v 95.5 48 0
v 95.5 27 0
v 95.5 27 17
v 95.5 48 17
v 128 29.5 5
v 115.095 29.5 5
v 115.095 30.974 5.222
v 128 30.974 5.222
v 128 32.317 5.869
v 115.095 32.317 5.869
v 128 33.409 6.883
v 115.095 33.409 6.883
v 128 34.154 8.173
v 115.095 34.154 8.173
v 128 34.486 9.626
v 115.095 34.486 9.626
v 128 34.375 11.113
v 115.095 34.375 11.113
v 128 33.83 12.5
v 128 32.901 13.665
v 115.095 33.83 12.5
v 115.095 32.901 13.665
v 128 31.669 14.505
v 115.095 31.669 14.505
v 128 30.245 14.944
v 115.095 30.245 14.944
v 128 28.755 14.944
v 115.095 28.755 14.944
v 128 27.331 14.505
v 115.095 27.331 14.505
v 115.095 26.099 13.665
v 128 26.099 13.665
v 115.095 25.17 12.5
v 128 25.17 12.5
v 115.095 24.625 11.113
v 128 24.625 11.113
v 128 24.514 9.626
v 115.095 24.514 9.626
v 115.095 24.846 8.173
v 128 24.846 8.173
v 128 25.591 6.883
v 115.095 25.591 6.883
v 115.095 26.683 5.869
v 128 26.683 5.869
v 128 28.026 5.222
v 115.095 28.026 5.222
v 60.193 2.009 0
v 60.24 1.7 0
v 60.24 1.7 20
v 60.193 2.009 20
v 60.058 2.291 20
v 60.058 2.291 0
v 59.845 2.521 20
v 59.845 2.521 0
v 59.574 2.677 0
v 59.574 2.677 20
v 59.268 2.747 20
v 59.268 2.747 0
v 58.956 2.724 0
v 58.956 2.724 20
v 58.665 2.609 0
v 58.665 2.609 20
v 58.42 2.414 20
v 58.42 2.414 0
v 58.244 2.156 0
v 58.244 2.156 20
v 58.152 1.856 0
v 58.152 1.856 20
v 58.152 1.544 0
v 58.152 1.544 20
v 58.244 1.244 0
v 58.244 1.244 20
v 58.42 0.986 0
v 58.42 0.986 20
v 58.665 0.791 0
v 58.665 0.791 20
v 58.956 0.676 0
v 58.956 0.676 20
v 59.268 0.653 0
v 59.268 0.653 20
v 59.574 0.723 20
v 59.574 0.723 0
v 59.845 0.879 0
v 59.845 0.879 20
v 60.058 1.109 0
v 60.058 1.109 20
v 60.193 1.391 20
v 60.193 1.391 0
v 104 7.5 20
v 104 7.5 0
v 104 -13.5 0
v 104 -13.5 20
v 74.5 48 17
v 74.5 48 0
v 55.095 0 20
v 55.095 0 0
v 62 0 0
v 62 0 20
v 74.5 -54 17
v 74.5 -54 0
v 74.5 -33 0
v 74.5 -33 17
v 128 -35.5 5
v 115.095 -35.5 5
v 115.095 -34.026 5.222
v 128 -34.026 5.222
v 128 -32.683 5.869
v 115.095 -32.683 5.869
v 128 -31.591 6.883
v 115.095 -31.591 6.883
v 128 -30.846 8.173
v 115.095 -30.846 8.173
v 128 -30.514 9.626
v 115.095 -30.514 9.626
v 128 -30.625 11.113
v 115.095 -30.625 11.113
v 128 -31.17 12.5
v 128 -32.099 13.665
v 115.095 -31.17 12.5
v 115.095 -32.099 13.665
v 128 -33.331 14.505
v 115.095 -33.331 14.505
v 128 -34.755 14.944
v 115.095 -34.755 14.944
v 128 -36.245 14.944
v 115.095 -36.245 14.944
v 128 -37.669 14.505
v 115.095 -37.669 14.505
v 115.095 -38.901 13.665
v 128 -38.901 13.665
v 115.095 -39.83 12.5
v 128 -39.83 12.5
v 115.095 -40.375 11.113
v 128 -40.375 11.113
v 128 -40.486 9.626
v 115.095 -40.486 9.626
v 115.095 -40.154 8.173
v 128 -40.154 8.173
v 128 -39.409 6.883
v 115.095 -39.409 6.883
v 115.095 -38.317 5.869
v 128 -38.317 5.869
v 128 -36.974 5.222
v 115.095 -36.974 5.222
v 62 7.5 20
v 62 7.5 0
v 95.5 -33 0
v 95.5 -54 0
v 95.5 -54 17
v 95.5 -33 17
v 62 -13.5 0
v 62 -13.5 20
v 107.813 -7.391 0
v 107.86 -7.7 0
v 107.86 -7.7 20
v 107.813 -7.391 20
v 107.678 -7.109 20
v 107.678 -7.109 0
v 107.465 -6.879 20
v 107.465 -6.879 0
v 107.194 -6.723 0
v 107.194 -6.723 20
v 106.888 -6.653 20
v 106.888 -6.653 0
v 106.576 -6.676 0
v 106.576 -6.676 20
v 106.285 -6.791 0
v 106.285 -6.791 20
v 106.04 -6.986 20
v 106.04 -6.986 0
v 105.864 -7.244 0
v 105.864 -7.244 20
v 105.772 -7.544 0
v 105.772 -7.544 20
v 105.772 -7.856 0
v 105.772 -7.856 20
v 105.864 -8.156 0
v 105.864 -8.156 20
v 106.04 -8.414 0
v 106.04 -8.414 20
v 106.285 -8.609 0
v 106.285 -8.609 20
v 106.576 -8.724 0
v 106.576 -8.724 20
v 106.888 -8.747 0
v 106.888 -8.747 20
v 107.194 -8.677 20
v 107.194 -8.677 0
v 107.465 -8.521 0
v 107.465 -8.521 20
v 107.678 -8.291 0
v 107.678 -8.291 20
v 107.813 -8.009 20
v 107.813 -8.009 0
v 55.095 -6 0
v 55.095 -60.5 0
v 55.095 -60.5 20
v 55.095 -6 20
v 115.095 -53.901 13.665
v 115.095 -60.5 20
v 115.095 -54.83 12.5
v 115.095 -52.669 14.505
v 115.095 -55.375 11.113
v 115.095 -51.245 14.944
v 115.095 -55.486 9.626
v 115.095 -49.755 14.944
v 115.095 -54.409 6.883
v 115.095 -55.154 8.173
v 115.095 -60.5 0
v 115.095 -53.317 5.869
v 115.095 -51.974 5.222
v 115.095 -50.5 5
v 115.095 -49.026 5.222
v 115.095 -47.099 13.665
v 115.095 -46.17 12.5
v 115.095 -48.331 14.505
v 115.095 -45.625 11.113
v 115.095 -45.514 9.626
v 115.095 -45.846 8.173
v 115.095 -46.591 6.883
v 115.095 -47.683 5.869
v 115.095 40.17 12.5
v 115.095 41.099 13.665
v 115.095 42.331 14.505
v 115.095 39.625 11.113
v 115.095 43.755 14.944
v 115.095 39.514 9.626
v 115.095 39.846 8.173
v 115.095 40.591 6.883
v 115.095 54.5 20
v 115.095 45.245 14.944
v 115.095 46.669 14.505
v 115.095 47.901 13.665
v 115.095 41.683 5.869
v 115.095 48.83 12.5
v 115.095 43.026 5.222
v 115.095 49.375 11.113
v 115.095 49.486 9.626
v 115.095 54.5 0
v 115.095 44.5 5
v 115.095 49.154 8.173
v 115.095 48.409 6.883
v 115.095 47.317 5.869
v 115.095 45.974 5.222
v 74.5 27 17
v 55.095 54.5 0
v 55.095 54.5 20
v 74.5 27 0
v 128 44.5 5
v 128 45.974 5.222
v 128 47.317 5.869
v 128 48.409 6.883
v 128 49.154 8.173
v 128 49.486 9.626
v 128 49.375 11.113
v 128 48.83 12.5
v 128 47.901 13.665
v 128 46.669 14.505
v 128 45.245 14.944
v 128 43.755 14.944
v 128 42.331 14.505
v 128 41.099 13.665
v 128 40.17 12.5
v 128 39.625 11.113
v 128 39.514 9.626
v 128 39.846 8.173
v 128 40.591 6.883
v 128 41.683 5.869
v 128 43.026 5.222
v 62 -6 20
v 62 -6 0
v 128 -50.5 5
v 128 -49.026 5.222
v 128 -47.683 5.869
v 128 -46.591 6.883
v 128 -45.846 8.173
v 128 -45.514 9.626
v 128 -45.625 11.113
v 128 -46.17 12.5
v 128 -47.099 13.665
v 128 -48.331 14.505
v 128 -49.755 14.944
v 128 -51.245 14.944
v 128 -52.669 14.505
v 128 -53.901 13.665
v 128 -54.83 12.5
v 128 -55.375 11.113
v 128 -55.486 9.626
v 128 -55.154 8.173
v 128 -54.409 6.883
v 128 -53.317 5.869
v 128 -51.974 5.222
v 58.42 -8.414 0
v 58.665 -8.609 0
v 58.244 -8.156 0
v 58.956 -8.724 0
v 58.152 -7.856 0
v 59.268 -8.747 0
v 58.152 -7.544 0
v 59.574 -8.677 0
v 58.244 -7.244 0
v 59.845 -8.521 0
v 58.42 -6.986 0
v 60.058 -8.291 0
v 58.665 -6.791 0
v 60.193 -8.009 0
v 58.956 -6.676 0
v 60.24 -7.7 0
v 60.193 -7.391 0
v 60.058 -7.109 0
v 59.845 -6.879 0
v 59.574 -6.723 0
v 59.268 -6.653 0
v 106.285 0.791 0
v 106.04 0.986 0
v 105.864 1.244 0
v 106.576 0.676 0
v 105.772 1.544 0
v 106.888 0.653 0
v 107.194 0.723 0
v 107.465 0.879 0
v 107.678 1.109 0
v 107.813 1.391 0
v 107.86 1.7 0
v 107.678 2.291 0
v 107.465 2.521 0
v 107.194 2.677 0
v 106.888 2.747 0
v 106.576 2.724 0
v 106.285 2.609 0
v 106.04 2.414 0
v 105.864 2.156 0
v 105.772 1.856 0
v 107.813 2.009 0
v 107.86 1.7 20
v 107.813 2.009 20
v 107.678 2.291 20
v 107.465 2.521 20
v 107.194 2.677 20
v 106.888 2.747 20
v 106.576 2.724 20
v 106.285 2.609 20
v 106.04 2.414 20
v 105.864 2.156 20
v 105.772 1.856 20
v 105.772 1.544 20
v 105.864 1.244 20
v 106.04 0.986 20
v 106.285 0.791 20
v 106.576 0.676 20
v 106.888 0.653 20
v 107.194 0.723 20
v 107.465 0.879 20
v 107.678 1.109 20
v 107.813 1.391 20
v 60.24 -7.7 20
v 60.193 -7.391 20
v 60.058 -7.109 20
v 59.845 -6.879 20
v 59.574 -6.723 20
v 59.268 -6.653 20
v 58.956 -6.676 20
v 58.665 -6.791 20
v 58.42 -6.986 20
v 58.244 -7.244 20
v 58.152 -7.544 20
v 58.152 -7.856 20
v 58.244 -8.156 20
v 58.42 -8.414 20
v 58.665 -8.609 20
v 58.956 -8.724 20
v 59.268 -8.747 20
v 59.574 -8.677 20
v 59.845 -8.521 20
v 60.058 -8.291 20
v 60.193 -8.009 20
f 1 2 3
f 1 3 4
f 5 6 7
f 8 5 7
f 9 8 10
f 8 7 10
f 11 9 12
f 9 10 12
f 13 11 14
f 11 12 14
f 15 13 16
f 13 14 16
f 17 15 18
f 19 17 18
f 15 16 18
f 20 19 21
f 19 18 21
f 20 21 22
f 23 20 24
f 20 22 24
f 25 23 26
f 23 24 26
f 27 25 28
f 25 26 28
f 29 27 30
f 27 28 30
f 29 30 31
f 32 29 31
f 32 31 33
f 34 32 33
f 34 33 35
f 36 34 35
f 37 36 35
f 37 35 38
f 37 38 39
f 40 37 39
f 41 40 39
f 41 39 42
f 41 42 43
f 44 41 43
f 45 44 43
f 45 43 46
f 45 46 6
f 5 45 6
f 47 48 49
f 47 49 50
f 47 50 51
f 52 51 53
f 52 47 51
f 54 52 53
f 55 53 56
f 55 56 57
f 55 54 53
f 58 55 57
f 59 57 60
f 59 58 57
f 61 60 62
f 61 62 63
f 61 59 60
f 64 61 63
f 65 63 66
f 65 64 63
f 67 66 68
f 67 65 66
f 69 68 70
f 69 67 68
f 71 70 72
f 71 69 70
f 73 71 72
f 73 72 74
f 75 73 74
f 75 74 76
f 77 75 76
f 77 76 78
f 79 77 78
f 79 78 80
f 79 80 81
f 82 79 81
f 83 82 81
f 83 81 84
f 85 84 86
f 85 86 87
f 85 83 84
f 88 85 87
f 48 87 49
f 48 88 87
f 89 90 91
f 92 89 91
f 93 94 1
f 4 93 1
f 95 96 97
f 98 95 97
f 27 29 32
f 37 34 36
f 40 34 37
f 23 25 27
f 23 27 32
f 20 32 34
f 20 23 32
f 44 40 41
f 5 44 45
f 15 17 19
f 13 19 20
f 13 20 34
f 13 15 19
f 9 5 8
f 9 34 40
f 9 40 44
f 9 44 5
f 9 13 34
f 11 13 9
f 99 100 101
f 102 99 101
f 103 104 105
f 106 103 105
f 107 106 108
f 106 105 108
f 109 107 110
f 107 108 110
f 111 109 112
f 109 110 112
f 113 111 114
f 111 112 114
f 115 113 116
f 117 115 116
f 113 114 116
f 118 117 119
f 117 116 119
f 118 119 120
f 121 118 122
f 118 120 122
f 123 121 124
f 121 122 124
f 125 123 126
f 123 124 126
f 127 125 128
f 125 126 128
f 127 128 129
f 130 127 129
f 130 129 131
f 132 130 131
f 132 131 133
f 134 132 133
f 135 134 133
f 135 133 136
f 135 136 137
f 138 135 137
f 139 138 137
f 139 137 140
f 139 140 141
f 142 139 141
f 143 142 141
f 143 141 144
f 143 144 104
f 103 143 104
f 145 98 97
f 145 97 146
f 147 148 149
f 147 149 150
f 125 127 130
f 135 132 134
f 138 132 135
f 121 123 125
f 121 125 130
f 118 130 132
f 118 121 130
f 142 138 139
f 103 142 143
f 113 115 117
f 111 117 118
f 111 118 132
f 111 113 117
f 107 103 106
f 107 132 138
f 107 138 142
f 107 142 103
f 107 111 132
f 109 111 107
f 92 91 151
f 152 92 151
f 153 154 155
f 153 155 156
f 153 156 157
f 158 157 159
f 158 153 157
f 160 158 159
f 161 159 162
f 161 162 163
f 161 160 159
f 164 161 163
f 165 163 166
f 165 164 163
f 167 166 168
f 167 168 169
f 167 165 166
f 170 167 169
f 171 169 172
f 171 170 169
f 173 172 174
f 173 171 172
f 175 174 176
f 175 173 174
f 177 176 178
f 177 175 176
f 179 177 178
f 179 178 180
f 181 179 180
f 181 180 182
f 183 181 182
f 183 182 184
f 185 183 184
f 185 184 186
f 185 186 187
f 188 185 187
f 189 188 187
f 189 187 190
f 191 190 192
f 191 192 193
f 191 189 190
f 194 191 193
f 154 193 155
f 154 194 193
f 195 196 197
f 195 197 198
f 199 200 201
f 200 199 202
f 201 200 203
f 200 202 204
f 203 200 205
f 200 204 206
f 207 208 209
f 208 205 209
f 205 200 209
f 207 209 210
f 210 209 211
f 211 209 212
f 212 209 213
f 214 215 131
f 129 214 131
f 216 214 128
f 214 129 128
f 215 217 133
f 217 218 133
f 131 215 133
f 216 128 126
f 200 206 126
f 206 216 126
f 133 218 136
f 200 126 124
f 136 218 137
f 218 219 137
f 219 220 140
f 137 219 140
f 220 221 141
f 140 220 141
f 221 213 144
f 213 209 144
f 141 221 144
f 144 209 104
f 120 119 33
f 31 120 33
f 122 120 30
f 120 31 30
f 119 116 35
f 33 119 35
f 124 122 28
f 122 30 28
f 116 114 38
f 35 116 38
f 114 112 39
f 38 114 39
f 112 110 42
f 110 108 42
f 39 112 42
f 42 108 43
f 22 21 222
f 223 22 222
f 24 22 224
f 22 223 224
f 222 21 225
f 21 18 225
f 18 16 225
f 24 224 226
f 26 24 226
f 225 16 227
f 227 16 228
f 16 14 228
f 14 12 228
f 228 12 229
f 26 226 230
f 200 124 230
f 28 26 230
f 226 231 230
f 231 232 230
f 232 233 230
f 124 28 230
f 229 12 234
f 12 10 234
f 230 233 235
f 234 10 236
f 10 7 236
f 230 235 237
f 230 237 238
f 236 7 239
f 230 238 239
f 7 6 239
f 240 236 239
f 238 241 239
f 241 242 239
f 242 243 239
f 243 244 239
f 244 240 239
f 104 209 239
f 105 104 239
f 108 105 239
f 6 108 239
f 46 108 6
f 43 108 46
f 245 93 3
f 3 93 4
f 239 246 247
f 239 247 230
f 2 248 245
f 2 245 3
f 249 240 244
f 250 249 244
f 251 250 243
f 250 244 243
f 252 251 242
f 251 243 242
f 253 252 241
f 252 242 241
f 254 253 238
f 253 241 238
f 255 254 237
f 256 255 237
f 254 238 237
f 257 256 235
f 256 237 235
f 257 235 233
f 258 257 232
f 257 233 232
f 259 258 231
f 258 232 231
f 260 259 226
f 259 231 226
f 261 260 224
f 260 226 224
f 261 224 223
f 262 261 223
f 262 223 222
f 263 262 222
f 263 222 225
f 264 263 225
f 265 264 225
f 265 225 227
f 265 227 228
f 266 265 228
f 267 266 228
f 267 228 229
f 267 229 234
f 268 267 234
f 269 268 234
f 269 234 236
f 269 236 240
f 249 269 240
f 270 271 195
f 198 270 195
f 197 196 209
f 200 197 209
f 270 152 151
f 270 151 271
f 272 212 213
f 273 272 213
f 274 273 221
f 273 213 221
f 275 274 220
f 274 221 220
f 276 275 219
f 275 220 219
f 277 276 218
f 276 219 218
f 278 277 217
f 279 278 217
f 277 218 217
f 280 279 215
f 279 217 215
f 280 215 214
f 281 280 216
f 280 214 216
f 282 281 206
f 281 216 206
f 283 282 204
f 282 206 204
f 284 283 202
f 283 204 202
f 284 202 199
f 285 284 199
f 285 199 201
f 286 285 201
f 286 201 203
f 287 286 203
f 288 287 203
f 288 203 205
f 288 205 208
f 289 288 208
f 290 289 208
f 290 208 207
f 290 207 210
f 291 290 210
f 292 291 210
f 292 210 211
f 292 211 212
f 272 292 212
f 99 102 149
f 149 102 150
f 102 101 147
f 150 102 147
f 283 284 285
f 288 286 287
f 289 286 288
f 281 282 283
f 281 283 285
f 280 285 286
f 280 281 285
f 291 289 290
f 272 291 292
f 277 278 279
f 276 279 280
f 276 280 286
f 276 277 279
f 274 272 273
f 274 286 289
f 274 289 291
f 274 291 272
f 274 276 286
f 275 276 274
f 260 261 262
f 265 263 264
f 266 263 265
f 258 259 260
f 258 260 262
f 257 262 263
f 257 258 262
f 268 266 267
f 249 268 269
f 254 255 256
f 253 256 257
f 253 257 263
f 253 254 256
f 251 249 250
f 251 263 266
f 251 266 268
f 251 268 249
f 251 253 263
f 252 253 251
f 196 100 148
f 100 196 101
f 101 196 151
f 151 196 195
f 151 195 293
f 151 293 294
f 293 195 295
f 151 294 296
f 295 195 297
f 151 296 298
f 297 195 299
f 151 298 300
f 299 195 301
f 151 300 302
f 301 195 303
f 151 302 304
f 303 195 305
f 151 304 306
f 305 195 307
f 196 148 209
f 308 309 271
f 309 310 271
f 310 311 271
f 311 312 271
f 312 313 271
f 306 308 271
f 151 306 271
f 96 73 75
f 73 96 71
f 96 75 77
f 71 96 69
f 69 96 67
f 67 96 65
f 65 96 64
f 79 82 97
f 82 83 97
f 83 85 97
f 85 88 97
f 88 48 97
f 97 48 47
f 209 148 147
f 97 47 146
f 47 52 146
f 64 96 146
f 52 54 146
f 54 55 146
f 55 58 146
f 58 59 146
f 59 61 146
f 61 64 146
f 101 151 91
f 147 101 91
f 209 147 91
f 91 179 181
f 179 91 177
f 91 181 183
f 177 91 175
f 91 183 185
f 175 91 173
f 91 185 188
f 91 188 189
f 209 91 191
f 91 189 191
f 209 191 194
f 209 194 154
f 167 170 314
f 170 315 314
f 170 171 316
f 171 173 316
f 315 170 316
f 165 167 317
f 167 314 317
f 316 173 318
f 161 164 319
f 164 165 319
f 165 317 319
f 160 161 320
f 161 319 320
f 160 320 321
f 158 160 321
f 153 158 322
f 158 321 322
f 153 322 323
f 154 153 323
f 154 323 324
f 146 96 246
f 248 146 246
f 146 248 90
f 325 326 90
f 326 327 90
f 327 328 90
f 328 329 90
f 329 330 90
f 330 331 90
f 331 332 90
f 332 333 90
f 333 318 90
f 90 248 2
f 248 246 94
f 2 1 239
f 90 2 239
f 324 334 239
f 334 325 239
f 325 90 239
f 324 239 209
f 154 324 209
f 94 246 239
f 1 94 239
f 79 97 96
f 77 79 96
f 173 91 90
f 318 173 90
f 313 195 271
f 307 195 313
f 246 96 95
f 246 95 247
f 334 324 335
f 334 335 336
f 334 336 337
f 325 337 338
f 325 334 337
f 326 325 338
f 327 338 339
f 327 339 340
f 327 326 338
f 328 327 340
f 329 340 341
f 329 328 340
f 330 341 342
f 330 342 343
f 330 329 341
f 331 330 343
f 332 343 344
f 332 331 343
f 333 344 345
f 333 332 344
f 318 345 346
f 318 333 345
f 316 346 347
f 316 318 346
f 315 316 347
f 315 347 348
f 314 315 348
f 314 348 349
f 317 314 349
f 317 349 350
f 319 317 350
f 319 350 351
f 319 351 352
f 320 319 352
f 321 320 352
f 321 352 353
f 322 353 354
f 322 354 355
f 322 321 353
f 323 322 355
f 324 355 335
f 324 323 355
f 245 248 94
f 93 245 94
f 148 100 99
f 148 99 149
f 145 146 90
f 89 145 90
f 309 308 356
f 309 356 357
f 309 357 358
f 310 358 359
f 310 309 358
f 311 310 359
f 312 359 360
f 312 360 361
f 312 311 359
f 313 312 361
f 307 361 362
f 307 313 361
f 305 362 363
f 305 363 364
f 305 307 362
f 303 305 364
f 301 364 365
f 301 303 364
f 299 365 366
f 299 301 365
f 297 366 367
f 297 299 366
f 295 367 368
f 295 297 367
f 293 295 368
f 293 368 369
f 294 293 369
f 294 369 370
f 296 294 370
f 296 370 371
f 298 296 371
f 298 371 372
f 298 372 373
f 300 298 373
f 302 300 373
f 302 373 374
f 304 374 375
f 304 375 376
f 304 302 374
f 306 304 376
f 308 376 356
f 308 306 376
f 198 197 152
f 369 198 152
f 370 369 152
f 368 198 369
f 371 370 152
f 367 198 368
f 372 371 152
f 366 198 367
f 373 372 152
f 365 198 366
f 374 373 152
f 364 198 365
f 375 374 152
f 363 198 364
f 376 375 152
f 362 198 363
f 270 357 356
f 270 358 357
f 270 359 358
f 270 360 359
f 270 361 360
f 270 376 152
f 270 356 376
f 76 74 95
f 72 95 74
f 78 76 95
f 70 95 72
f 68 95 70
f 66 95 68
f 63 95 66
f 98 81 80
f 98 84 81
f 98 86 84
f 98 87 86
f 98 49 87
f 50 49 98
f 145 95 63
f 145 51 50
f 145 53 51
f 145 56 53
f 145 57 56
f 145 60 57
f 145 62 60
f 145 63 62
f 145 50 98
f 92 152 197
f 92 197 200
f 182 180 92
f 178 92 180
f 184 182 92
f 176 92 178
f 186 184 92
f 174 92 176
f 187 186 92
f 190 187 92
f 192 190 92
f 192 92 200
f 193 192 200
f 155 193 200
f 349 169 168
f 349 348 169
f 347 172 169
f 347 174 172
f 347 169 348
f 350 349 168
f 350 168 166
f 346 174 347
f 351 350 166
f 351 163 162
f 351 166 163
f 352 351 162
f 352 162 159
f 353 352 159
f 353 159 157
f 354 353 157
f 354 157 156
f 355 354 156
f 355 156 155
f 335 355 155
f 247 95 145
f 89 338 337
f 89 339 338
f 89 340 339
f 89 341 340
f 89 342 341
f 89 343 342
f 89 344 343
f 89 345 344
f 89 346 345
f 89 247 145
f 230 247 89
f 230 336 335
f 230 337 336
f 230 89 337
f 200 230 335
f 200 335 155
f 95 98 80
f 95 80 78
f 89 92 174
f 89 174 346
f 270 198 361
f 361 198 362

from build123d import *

# Parameters (mm, degrees)
SKETCH_5_W           = 60
SKETCH_5_H           = 115
EXTRUDE_2_DEPTH      = 20
SKETCH_1_R           = 1.05
CUT_EXTRUDE_4_DEPTH  = 20
SKETCH_6_R           = 5
EXTRUDE_3_DEPTH      = 13
SKETCH_22_W          = 21
SKETCH_22_H          = 21
CUT_EXTRUDE_9_DEPTH  = 17
SKETCH_22_6_W        = 21
SKETCH_22_6_H        = 21
CUT_EXTRUDE_10_DEPTH = 17


with BuildPart() as part:
    # Sketch 5 → Extrude 2 (new body)
    with BuildSketch(Plane.XY):
        with Locations((85.095319229, -3)):
            Rectangle(SKETCH_5_W, SKETCH_5_H)
    extrude(amount=EXTRUDE_2_DEPTH)

    # Sketch 1 → Cut-Extrude 4 (cut)
    with BuildSketch(Plane.XY):
        with Locations((59.19, 1.7)):
            Circle(SKETCH_1_R)
        with Locations((106.81, 1.7)):
            Circle(SKETCH_1_R)
        with Locations((106.81, -7.7)):
            Circle(SKETCH_1_R)
        with Locations((59.19, -7.7)):
            Circle(SKETCH_1_R)
        Polygon((55, -3), (55, 0), (62, 0), (62, 7.5), (104, 7.5), (104, -13.5), (62, -13.5), (62, -6), (55, -6), align=None)
    extrude(amount=CUT_EXTRUDE_4_DEPTH, mode=Mode.SUBTRACT)

    # Sketch 6 → Extrude 3 (add)
    with BuildSketch(Plane(origin=(115, 0, 0), x_dir=(0, 0, -1), z_dir=(1, 0, 0))):
        with Locations((-10, 44.5)):
            Circle(SKETCH_6_R)
        with Locations((-10, 29.5)):
            Circle(SKETCH_6_R)
        with Locations((-10, -35.5)):
            Circle(SKETCH_6_R)
        with Locations((-10, -50.5)):
            Circle(SKETCH_6_R)
    extrude(amount=EXTRUDE_3_DEPTH)

    # Sketch 22 → Cut-Extrude 9 (cut)
    with BuildSketch(Plane.XY):
        with Locations((85, 37.5)):
            Rectangle(SKETCH_22_W, SKETCH_22_H)
    extrude(amount=CUT_EXTRUDE_9_DEPTH, mode=Mode.SUBTRACT)

    # Sketch 22_6 → Cut-Extrude 10 (cut)
    with BuildSketch(Plane.XY):
        with Locations((85, -43.5)):
            Rectangle(SKETCH_22_6_W, SKETCH_22_6_H)
    extrude(amount=CUT_EXTRUDE_10_DEPTH, mode=Mode.SUBTRACT)


solid = part.part
